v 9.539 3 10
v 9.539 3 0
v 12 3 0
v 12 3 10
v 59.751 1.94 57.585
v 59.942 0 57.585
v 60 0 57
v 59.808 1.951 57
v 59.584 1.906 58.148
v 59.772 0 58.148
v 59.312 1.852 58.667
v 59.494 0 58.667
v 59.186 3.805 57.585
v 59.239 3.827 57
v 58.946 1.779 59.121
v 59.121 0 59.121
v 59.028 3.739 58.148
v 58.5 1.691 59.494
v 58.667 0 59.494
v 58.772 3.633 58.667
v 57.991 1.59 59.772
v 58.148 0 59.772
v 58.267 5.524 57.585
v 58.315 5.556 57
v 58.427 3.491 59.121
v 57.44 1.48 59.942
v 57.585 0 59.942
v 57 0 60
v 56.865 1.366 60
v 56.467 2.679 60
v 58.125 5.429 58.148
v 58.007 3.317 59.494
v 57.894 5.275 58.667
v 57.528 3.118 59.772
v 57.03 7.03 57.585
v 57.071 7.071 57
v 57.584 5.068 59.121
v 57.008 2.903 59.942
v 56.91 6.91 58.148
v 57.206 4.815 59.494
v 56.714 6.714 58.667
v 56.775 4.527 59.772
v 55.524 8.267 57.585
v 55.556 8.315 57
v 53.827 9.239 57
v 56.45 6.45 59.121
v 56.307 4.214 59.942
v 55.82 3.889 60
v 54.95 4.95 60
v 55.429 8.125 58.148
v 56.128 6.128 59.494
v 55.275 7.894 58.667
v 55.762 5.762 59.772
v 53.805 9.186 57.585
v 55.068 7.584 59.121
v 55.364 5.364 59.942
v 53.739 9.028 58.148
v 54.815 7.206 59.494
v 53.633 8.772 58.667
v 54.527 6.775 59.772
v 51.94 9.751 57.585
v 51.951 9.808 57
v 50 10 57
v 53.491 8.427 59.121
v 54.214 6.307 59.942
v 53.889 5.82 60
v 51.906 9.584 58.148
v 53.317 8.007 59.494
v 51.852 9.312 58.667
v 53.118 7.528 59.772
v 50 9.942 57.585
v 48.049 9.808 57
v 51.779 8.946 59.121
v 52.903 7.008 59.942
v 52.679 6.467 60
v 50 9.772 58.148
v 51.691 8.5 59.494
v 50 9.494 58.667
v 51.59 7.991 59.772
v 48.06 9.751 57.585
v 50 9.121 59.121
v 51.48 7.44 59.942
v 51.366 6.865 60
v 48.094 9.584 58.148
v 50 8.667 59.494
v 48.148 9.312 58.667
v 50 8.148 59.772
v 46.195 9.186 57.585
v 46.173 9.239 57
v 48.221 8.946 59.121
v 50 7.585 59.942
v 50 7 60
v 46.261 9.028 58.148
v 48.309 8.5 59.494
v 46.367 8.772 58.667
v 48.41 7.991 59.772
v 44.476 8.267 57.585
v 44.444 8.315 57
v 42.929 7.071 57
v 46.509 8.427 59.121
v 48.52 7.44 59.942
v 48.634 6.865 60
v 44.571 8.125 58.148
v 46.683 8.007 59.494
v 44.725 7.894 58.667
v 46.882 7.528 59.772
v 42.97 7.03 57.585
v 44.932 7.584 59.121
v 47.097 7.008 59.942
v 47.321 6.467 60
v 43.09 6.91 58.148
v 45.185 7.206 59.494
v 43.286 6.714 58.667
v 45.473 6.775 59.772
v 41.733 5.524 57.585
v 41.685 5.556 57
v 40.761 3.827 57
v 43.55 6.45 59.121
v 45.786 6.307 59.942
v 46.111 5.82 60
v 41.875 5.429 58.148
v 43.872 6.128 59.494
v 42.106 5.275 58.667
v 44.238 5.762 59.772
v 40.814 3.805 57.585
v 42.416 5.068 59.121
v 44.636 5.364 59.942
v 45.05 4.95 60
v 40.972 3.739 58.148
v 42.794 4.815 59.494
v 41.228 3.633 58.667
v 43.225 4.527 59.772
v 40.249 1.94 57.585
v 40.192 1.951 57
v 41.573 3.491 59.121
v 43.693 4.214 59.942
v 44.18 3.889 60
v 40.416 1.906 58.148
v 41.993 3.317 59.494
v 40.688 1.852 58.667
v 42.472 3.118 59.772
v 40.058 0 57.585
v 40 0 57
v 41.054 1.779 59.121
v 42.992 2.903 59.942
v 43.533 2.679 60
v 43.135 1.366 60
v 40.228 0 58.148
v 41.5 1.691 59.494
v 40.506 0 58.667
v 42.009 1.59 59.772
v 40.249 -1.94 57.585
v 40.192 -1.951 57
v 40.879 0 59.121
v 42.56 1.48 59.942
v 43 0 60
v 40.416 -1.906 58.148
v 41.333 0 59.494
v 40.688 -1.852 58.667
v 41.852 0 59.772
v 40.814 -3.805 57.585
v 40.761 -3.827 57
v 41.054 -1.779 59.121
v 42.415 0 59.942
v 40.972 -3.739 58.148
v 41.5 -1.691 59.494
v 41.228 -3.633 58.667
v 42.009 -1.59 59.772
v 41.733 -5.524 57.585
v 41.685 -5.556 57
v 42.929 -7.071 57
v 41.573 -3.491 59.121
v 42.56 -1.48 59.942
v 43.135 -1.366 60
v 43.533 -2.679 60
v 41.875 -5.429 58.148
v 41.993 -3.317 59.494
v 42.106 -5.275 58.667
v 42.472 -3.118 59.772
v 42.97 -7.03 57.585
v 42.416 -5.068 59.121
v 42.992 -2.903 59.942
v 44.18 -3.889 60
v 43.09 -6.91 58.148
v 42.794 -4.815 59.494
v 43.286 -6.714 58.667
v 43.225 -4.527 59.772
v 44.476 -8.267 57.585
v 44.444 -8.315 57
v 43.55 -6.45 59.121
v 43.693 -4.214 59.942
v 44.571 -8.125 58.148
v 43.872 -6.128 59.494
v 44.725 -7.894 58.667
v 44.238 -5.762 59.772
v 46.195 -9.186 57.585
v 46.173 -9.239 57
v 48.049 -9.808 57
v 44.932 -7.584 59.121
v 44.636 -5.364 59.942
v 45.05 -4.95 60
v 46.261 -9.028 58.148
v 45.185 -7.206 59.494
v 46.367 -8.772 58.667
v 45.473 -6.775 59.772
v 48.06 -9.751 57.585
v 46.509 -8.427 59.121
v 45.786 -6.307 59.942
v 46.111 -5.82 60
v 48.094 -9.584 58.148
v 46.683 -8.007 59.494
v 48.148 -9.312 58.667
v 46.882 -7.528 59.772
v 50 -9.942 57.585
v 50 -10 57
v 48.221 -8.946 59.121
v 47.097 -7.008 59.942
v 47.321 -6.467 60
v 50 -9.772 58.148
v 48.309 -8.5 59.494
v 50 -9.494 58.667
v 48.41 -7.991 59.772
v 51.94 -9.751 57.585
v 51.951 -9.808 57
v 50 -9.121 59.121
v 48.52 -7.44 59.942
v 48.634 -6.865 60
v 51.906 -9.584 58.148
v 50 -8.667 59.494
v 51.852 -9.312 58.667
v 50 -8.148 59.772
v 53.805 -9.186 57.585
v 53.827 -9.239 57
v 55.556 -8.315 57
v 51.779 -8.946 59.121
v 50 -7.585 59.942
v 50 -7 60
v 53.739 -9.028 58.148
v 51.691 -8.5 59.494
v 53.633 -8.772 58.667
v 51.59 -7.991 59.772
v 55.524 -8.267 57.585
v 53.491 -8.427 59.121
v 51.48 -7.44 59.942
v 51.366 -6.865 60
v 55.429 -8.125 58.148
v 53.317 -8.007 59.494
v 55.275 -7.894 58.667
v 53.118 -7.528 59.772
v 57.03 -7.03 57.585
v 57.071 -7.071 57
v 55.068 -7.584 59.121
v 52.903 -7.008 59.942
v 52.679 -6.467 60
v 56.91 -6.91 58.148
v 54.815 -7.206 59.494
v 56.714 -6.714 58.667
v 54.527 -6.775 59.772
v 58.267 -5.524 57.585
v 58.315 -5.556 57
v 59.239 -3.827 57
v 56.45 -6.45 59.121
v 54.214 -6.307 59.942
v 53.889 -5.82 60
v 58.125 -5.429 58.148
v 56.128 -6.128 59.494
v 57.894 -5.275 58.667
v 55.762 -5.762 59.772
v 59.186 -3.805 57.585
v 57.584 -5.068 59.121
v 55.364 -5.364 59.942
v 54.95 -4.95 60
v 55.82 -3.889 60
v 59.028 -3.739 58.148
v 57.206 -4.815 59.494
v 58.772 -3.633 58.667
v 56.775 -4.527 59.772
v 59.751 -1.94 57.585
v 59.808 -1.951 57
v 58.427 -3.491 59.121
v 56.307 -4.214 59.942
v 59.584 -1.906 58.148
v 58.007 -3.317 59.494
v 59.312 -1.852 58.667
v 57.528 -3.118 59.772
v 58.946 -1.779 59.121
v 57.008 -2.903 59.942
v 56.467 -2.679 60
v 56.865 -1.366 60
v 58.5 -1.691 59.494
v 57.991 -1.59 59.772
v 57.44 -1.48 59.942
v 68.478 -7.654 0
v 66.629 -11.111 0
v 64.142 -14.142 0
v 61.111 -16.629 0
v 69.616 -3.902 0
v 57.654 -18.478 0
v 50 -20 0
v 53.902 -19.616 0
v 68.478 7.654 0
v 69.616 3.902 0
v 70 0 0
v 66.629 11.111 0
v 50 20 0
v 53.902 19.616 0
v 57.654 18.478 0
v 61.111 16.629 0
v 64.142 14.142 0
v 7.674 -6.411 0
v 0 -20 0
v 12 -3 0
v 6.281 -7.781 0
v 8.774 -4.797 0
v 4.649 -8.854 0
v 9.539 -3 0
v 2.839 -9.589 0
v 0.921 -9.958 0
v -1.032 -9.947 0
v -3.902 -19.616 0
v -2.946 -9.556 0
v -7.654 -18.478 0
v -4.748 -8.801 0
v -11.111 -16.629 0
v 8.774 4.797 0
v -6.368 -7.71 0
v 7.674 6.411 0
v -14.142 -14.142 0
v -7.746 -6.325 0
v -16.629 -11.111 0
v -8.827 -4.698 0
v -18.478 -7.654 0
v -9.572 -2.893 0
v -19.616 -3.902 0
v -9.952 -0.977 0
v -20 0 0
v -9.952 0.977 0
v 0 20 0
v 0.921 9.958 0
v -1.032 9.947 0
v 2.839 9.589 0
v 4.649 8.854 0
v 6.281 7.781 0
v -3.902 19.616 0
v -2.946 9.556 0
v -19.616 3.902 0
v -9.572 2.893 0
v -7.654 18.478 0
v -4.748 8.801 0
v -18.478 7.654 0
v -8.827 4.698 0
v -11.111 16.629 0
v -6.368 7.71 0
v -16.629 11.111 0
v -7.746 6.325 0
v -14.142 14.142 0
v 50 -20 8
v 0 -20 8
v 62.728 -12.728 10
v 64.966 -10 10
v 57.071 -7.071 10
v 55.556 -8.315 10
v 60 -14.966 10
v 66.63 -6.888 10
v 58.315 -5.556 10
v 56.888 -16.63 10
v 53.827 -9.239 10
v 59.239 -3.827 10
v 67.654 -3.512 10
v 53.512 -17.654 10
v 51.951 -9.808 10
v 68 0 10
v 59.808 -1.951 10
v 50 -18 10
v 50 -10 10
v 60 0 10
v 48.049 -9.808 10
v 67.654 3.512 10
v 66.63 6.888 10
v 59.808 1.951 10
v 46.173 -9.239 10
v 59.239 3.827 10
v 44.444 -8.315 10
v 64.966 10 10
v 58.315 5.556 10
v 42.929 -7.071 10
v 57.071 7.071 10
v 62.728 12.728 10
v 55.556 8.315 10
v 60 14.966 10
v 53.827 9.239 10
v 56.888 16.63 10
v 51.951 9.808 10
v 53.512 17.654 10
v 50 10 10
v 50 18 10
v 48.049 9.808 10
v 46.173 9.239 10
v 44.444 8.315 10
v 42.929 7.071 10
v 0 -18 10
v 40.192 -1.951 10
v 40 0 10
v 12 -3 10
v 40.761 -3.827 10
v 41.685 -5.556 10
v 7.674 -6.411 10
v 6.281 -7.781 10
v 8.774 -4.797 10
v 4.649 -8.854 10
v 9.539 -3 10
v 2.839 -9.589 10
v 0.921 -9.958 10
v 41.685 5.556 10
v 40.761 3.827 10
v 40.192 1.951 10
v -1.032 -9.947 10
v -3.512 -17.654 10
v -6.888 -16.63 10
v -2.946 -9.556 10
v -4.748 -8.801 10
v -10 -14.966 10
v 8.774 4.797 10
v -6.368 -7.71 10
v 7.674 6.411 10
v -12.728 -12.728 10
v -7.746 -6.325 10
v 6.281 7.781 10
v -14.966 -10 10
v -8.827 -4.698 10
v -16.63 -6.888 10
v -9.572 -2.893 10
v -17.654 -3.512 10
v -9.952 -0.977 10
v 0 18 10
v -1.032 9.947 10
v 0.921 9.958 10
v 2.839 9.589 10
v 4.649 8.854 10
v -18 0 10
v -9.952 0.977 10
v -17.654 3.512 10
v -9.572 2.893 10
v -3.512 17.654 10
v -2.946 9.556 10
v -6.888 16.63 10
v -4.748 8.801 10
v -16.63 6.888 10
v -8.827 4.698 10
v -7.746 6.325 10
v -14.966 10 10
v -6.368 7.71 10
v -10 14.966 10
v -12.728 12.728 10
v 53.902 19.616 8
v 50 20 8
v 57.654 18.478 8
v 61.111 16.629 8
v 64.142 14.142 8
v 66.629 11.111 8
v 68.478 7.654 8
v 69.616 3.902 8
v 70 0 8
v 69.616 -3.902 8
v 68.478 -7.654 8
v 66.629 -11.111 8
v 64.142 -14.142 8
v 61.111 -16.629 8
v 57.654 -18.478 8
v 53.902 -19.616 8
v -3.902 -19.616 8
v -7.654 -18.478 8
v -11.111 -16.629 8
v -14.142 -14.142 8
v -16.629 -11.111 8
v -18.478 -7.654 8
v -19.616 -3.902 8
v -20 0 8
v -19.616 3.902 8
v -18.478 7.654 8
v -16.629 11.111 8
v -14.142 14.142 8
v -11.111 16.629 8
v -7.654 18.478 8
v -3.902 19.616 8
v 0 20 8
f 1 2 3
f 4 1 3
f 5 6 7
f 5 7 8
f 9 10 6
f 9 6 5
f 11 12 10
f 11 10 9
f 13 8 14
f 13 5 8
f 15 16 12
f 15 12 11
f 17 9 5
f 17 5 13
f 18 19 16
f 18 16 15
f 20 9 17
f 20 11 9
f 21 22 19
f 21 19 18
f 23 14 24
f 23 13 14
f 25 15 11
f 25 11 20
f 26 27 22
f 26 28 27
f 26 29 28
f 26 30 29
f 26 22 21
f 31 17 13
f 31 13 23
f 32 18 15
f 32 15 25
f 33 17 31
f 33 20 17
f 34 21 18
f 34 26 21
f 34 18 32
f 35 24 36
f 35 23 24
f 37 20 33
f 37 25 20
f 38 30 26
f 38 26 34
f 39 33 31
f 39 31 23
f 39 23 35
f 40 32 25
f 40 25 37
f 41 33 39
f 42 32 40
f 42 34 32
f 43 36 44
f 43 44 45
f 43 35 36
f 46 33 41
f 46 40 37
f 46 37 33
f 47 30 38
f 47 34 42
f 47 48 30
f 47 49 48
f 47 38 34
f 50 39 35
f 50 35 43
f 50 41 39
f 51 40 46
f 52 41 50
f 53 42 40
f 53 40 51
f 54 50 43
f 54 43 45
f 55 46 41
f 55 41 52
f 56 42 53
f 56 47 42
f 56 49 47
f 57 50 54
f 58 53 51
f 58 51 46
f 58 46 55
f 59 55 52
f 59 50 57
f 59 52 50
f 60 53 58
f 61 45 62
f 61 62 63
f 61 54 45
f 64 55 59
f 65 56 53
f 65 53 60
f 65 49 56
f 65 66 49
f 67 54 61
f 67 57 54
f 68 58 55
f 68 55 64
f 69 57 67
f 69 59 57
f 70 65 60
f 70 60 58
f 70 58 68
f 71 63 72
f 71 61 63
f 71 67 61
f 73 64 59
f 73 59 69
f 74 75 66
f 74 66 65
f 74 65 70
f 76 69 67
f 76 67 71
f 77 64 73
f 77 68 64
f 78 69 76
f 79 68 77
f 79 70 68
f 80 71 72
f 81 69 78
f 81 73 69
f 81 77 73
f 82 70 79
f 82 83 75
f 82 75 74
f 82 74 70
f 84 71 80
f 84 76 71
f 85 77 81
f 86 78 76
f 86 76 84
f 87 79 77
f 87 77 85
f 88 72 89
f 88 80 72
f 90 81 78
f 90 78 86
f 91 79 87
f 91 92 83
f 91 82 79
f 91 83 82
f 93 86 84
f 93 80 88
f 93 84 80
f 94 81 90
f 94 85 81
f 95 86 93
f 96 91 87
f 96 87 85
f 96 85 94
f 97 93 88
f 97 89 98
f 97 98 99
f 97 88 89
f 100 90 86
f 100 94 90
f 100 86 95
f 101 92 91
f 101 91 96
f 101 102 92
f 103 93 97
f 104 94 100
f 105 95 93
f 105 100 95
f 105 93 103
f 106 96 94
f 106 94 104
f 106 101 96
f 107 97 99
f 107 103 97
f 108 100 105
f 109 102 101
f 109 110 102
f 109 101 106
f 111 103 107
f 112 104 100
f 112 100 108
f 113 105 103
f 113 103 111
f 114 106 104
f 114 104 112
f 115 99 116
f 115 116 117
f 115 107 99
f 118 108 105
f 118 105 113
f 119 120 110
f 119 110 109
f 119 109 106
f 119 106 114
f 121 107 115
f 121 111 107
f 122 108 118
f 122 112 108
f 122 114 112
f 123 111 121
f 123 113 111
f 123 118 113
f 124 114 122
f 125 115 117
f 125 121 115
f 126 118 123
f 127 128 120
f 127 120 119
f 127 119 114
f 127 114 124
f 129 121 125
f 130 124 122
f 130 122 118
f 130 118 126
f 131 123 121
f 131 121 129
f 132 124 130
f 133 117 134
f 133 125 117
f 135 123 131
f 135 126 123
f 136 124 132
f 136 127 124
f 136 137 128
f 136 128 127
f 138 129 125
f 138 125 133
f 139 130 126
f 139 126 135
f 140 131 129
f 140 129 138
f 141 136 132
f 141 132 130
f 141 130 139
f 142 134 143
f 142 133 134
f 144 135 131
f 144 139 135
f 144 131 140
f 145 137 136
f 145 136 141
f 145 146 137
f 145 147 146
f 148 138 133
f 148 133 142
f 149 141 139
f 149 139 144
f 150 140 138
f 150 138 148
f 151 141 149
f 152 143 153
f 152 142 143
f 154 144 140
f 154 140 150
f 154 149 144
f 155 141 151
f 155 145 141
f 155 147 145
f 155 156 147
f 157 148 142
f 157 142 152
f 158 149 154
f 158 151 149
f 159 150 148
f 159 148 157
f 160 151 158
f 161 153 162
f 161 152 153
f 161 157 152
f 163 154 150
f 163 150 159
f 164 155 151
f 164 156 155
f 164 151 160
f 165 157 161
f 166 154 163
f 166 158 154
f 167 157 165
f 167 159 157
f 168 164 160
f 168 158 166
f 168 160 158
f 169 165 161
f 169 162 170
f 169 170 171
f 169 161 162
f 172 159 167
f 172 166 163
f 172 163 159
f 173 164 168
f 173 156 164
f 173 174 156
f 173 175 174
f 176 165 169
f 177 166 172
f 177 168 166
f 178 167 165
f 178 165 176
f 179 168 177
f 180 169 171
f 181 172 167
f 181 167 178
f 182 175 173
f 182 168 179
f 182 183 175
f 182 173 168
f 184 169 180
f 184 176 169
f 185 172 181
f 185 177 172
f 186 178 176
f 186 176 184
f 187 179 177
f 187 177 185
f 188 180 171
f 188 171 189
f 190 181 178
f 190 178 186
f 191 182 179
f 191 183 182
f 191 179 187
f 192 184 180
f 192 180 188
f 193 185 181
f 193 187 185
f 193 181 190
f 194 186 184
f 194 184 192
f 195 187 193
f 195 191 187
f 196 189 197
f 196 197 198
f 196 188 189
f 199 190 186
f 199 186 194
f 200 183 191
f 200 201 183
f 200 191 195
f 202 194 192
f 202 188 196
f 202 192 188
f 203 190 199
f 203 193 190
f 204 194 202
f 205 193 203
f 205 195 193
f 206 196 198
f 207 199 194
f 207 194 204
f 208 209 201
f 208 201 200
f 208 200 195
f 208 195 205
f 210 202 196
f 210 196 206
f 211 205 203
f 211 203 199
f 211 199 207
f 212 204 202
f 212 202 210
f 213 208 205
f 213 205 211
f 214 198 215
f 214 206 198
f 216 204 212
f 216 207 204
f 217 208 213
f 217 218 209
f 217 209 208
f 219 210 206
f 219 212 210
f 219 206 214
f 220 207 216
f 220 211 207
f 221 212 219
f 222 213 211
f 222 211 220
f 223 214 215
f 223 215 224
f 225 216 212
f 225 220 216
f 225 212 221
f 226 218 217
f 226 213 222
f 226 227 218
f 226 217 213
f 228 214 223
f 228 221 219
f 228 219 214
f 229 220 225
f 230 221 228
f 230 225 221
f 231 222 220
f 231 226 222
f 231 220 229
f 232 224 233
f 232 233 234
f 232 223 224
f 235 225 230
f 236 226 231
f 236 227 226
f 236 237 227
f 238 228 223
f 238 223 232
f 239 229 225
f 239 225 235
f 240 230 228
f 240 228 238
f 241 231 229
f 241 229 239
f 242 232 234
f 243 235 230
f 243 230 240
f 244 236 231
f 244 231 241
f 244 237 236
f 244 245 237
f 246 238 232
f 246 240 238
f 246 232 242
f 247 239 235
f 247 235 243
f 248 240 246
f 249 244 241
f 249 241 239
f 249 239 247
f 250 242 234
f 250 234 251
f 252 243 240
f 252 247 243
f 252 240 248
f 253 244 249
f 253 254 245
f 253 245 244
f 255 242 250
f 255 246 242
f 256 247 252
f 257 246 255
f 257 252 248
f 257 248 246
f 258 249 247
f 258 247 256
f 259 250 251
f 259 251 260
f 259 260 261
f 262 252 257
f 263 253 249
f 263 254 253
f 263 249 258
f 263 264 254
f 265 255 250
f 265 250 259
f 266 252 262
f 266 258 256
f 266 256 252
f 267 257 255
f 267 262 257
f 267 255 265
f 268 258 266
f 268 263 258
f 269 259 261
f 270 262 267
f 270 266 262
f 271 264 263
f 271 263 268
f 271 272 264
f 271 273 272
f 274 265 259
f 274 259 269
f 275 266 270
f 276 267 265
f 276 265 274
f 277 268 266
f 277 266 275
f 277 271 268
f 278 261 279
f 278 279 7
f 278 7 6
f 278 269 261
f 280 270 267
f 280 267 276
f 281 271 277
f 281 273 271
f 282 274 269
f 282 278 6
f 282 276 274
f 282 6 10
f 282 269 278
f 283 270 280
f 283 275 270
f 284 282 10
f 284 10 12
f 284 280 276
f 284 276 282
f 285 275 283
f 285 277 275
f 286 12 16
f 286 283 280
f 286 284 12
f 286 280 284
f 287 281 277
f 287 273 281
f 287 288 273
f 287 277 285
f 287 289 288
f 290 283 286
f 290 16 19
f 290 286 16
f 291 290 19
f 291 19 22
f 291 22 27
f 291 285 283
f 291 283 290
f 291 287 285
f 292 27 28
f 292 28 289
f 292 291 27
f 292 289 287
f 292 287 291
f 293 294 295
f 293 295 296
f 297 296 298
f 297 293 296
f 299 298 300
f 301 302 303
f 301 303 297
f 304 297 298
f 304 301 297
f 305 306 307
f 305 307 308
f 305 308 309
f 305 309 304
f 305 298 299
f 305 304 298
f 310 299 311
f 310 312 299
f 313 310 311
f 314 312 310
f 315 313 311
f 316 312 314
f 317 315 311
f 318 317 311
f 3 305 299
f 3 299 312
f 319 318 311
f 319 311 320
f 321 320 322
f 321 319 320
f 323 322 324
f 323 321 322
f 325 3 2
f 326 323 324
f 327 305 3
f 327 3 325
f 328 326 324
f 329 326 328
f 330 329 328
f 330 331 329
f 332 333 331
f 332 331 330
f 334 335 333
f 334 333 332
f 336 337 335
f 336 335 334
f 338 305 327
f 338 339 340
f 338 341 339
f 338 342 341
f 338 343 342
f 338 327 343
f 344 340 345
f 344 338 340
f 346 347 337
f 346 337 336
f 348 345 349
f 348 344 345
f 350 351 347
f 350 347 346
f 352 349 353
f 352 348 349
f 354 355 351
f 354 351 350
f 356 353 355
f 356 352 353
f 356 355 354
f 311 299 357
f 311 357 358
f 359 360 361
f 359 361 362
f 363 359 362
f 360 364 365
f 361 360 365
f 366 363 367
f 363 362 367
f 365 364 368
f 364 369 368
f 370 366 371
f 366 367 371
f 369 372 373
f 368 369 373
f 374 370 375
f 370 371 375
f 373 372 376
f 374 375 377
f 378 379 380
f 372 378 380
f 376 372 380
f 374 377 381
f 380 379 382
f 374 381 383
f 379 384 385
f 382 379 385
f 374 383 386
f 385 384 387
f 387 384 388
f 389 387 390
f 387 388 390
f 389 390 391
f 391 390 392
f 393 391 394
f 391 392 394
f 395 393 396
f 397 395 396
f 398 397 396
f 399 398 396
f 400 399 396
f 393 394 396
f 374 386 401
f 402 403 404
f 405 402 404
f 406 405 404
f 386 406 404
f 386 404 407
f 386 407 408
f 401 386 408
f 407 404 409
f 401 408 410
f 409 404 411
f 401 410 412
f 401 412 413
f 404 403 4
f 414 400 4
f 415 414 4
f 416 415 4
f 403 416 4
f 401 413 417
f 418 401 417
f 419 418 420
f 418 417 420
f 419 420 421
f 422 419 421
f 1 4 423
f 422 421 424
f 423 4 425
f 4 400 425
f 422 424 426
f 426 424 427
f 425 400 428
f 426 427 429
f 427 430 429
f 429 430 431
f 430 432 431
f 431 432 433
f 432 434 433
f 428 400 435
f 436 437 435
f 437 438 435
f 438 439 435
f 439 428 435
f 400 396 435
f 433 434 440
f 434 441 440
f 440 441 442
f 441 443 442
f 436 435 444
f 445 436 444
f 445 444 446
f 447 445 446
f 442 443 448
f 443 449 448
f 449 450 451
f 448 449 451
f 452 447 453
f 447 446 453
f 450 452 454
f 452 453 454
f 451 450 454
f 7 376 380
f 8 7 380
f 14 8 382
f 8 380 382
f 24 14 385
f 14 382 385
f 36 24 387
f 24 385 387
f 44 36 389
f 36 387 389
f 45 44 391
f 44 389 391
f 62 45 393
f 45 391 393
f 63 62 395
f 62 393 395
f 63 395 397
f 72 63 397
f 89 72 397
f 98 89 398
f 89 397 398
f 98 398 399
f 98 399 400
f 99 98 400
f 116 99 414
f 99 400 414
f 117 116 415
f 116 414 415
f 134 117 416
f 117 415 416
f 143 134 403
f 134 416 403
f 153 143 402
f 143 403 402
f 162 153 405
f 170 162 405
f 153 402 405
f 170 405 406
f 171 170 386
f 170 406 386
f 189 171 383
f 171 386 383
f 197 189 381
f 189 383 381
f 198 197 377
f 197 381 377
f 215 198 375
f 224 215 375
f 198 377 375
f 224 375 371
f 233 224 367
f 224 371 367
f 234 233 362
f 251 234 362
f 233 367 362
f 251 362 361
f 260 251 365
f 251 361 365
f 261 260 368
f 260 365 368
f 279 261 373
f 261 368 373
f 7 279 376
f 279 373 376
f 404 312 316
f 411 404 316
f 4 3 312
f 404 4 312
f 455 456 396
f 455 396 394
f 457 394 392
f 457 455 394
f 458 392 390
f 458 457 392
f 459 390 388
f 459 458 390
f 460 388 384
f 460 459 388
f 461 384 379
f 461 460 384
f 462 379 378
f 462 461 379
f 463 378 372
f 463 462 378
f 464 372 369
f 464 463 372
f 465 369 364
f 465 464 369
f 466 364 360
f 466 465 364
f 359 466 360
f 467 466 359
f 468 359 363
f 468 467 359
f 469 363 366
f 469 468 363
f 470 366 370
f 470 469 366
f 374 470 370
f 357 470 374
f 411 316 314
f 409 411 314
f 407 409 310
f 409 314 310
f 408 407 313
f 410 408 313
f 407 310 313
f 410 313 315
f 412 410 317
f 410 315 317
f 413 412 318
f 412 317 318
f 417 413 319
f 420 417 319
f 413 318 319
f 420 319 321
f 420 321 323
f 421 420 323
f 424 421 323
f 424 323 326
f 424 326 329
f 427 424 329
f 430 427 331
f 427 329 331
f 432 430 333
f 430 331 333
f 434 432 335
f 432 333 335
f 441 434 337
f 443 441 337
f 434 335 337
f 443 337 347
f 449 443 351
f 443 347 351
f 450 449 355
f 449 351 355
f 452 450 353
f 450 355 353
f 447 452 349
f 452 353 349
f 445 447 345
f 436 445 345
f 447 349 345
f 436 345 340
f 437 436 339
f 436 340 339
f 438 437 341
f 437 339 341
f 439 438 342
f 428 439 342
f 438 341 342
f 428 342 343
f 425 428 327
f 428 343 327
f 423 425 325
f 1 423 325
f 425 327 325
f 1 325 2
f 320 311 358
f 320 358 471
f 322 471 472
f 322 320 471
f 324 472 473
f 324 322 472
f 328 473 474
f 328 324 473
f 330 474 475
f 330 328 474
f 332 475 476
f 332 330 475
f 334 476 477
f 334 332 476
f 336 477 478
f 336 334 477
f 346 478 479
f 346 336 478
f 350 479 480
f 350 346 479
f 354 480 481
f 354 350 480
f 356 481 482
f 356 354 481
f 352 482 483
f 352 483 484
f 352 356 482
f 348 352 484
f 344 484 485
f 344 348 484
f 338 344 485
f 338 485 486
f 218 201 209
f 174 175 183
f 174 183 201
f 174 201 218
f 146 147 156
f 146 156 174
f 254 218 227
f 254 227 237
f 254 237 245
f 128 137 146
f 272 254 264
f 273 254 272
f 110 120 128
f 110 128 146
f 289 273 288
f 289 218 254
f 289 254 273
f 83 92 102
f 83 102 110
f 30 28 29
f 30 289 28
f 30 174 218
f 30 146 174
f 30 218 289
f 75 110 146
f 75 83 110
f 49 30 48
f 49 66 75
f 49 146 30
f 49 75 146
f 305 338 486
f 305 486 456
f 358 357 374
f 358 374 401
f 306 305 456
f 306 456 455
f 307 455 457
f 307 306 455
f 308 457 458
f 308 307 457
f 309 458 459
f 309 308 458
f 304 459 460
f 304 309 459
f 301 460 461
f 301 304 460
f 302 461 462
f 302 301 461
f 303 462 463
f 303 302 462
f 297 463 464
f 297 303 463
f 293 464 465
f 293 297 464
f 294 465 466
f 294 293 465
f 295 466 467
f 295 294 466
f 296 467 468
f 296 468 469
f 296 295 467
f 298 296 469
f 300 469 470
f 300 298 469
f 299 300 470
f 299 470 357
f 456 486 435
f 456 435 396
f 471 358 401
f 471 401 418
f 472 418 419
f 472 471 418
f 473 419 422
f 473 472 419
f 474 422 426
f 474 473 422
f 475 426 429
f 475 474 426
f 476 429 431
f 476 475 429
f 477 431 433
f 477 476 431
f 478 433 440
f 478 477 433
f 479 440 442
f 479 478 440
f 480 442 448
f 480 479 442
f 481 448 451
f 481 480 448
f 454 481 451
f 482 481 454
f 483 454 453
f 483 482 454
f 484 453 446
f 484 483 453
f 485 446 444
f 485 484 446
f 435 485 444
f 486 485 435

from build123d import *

# Parameters (mm, degrees)
BOSS_EXTRUDE1_DEPTH = 10
SKETCH2_R           = 10
BOSS_EXTRUDE2_DEPTH = 50
FILLET1_R           = 3
CHAMFER1_SIZE       = 2


with BuildPart() as part:
    # Sketch1 → Boss-Extrude1 (new body)
    with BuildSketch(Plane.XY):
        with BuildLine():
            Line((0, 20), (50, 20))
            ThreePointArc((50, 20), (70, 0), (50, -20))
            Line((50, -20), (0, -20))
            ThreePointArc((0, -20), (-20, 0), (0, 20))
        make_face()
        with BuildLine():
            Line((9.539392014, 3), (12, 3))
            Line((12, 3), (12, -3))
            Line((12, -3), (9.539392014, -3))
            ThreePointArc((9.539392014, -3), (-10, 0), (9.539392014, 3))
        make_face(mode=Mode.SUBTRACT)
    extrude(amount=BOSS_EXTRUDE1_DEPTH)

    # Sketch2 → Boss-Extrude2 (add)
    with BuildSketch(Plane.XY.offset(10)):
        with Locations((50, 0)):
            Circle(SKETCH2_R)
    extrude(amount=BOSS_EXTRUDE2_DEPTH)

    # Fillet1
    fillet1_edges = [part.edges().sort_by_distance(p)[0] for p in [
        (40, 0, 60),
    ]]
    fillet(fillet1_edges, radius=FILLET1_R)

    # Chamfer1
    chamfer1_edges = [part.edges().sort_by_distance(p)[0] for p in [
        (70, 0, 10),
        (25, 20, 10),
        (-20, 0, 10),
        (25, -20, 10),
    ]]
    chamfer(chamfer1_edges, length=CHAMFER1_SIZE)


solid = part.part
